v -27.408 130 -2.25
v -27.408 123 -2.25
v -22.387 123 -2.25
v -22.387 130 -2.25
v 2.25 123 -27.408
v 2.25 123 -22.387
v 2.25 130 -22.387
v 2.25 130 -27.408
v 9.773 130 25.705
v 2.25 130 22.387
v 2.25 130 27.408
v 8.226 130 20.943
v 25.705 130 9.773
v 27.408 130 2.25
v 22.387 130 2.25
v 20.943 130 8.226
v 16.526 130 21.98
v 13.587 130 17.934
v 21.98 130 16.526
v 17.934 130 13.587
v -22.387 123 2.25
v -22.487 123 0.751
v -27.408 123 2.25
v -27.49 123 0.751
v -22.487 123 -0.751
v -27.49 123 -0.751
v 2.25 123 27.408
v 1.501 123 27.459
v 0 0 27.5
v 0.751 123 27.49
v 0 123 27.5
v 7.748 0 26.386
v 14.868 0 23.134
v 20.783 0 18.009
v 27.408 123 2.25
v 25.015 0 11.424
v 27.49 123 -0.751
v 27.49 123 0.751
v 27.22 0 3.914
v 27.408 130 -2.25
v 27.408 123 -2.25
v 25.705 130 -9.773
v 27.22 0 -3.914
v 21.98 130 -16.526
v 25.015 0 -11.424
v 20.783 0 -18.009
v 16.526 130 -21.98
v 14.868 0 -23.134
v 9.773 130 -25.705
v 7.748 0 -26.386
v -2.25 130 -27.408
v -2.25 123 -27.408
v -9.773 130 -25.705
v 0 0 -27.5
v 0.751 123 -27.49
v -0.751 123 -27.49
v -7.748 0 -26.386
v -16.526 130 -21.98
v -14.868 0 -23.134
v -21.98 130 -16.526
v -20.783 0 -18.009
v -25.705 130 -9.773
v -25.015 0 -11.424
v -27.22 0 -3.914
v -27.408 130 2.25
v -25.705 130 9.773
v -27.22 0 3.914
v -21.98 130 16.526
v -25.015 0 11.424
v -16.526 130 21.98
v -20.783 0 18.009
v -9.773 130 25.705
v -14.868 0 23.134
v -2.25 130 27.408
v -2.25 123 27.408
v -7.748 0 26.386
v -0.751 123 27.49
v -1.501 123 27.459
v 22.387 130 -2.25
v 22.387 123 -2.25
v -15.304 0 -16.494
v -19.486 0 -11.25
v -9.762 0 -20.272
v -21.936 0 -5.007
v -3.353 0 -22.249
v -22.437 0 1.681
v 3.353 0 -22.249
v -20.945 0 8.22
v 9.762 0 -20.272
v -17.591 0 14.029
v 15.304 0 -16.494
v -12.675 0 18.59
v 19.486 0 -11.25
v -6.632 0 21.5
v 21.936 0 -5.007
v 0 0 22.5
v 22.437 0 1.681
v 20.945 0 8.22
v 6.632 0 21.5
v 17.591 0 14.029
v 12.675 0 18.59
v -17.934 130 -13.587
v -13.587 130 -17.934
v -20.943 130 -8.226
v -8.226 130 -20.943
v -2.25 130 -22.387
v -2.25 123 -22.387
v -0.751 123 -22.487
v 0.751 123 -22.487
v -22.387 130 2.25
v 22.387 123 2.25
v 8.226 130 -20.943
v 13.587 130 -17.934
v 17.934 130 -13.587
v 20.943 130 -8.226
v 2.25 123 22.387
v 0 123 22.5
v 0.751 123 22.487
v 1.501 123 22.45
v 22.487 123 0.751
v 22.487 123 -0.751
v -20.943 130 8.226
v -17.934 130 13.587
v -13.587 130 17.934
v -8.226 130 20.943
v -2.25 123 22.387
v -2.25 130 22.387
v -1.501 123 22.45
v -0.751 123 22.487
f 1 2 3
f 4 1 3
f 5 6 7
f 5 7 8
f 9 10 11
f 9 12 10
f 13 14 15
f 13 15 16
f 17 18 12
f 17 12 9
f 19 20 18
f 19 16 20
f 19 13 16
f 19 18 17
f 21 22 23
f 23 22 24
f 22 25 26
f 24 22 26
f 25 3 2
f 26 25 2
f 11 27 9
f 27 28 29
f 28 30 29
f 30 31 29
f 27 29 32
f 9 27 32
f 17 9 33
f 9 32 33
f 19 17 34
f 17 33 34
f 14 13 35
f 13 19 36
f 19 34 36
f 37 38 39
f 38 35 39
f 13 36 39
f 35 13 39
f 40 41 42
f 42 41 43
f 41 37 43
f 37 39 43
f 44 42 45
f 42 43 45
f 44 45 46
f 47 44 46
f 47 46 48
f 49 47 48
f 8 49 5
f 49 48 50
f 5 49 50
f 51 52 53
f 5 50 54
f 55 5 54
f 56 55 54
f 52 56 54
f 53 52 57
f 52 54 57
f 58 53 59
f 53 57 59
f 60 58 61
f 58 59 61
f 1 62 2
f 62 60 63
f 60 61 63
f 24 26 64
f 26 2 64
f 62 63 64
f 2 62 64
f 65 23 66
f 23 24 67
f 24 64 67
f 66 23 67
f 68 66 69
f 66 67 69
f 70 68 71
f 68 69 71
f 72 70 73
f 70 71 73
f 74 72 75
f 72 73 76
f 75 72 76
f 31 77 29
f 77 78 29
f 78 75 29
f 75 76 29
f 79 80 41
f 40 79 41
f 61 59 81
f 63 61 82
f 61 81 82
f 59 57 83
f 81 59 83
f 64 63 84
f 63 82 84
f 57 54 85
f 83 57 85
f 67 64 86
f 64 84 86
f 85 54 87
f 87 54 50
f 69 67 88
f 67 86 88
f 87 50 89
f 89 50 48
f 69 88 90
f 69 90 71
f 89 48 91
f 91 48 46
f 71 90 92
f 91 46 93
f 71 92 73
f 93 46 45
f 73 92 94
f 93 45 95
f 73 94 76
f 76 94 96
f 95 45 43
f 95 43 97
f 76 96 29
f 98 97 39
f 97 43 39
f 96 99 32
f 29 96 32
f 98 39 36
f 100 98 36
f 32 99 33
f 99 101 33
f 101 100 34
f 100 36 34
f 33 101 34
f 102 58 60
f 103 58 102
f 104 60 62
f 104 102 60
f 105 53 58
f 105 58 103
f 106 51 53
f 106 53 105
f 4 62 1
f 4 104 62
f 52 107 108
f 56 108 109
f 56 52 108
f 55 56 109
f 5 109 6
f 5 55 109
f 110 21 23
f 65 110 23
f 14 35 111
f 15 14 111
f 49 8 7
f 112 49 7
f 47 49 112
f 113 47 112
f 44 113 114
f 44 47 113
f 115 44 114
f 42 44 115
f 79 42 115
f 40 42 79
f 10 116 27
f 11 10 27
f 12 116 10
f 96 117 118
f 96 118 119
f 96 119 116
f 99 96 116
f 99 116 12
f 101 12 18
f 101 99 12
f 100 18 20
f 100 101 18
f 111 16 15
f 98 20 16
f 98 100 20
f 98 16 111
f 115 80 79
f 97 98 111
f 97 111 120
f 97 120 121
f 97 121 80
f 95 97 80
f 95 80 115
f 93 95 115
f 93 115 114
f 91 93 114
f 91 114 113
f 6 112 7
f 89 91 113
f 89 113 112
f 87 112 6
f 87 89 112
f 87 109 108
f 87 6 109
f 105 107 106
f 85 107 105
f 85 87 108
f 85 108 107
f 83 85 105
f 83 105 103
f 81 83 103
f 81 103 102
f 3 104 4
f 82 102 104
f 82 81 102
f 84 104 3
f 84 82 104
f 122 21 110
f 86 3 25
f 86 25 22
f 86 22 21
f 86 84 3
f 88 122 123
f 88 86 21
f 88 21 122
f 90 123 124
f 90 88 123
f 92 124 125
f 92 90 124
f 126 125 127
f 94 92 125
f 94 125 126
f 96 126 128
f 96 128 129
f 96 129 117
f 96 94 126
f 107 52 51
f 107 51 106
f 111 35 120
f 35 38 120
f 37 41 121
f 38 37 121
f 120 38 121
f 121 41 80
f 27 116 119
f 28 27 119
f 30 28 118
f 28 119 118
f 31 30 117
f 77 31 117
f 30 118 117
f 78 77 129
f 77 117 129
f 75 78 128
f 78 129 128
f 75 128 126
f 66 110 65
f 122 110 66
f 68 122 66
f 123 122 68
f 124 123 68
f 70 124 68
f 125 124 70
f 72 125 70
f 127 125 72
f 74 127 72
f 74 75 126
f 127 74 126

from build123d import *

# Parameters (mm, degrees)
SKETCH1_R           = 27.5
SKETCH1_R_2         = 22.5
BOSS_EXTRUDE1_DEPTH = 130
CUT_EXTRUDE1_START  = -7
CUT_EXTRUDE1_DEPTH  = 7


with BuildPart() as part:
    # Sketch1 → Boss-Extrude1 (new body)
    with BuildSketch(Plane(origin=(0, 0, 0), x_dir=(1, 0, 0), z_dir=(0, 1, 0))):
        with Locations(Location((0, 0, 0), (0, 0, 270))):
            Circle(SKETCH1_R)
        with Locations(Location((0, 0, 0), (0, 0, 270))):
            Circle(SKETCH1_R_2, mode=Mode.SUBTRACT)
    extrude(amount=BOSS_EXTRUDE1_DEPTH)

    # Sketch2 → Cut-Extrude1 (cut)
    with BuildSketch(Plane(origin=(0, 130, 0), x_dir=(1, 0, 0), z_dir=(0, 1, 0)).offset(CUT_EXTRUDE1_START)):
        with BuildLine():
            Line((-27.407799985, 2.25), (-22.387217335, 2.25))
            ThreePointArc((-22.387217335, 2.25), (-22.5, 0), (-22.387217335, -2.25))
            Line((-22.387217335, -2.25), (-27.407799985, -2.25))
            ThreePointArc((-27.407799985, -2.25), (-27.5, 0), (-27.407799985, 2.25))
        make_face()
        with BuildLine():
            Line((27.407799985, -2.25), (22.387217335, -2.25))
            ThreePointArc((22.387217335, -2.25), (22.5, 0), (22.387217335, 2.25))
            Line((22.387217335, 2.25), (27.407799985, 2.25))
            ThreePointArc((27.407799985, 2.25), (27.5, 0), (27.407799985, -2.25))
        make_face()
        with BuildLine():
            Line((-2.25, 27.407799985), (-2.25, 22.387217335))
            ThreePointArc((-2.25, 22.387217335), (0, 22.5), (2.25, 22.387217335))
            Line((2.25, 22.387217335), (2.25, 27.407799985))
            ThreePointArc((2.25, 27.407799985), (0, 27.5), (-2.25, 27.407799985))
        make_face()
        with BuildLine():
            Line((-2.25, -27.407799985), (-2.25, -22.387217335))
            ThreePointArc((-2.25, -22.387217335), (0, -22.5), (2.25, -22.387217335))
            Line((2.25, -22.387217335), (2.25, -27.407799985))
            ThreePointArc((2.25, -27.407799985), (0, -27.5), (-2.25, -27.407799985))
        make_face()
    extrude(amount=CUT_EXTRUDE1_DEPTH, mode=Mode.SUBTRACT)


solid = part.part
